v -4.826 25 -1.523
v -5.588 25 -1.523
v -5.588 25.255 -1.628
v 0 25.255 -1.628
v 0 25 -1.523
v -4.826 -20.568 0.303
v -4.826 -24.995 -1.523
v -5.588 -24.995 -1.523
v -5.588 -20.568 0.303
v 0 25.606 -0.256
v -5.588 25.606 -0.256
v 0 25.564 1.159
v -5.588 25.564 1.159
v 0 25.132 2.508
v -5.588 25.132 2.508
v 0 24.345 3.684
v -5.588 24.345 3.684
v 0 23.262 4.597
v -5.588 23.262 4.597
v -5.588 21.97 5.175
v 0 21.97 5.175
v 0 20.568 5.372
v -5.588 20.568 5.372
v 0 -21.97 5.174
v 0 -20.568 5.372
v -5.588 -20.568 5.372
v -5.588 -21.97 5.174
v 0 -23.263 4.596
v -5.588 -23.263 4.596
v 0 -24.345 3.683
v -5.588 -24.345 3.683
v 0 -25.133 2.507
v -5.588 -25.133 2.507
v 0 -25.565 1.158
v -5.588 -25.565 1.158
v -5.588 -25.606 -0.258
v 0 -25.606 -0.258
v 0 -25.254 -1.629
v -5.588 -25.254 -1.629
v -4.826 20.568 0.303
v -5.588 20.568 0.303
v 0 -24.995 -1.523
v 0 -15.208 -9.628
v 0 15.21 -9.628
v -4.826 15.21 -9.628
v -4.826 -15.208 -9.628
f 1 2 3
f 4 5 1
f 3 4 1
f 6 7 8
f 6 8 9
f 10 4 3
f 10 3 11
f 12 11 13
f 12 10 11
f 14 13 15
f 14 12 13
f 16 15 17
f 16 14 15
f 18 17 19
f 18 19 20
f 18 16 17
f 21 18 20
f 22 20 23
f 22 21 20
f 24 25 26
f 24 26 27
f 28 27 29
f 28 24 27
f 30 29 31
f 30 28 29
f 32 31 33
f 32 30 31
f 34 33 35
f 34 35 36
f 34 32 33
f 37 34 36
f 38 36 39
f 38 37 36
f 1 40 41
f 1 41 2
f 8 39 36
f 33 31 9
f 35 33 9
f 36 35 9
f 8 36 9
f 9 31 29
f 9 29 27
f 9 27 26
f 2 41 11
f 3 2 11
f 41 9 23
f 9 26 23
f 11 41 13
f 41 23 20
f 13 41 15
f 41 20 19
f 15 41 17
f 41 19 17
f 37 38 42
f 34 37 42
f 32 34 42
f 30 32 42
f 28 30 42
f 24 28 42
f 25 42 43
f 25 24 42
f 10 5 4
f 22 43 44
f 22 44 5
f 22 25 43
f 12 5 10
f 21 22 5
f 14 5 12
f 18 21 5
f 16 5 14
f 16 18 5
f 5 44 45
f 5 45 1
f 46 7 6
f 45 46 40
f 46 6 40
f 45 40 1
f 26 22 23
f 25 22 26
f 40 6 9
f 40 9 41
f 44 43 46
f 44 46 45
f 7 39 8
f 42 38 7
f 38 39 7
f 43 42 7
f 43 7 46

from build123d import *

# Parameters (mm, degrees)
F1_DEPTH = 5.588
F2_DEPTH = 4.826


with BuildPart() as f1:
    # F0 (on Right) → F1 (new body)
    with BuildSketch(Plane.YZ):
        with BuildLine():
            Line((-20.567739, 0.302803), (-20.567739, 5.372244))
            ThreePointArc((-20.567739, 5.372244), (-24.780512, 3.122693), (-25.254471, -1.629496))
            Line((-25.254471, -1.629496), (-24.99502, -1.522527))
            Line((-24.99502, -1.522527), (-20.567739, 0.302803))
        make_face()
        Polygon((20.567561, 5.372244), (-0.006439, 5.372244), (-20.567739, 5.372244), (-20.567739, 0.302803), (20.567561, 0.302803), align=None)
        with BuildLine():
            ThreePointArc((25.255113, -1.627505), (24.779735, 3.123587), (20.567561, 5.372244))
            Line((20.567561, 5.372244), (20.567561, 0.302803))
            Line((20.567561, 0.302803), (25.000183, -1.522527))
            Line((25.000183, -1.522527), (25.255113, -1.627505))
        make_face()
    extrude(amount=-F1_DEPTH)

    # F0 (on Right) → F2 (join)
    with BuildSketch(Plane.YZ):
        Polygon((20.567561, 0.302803), (-20.567739, 0.302803), (-24.99502, -1.522527), (-15.208358, -9.628492), (15.210344, -9.628492), (25.000183, -1.522527), align=None)
    extrude(amount=-F2_DEPTH)


solid = f1.part
